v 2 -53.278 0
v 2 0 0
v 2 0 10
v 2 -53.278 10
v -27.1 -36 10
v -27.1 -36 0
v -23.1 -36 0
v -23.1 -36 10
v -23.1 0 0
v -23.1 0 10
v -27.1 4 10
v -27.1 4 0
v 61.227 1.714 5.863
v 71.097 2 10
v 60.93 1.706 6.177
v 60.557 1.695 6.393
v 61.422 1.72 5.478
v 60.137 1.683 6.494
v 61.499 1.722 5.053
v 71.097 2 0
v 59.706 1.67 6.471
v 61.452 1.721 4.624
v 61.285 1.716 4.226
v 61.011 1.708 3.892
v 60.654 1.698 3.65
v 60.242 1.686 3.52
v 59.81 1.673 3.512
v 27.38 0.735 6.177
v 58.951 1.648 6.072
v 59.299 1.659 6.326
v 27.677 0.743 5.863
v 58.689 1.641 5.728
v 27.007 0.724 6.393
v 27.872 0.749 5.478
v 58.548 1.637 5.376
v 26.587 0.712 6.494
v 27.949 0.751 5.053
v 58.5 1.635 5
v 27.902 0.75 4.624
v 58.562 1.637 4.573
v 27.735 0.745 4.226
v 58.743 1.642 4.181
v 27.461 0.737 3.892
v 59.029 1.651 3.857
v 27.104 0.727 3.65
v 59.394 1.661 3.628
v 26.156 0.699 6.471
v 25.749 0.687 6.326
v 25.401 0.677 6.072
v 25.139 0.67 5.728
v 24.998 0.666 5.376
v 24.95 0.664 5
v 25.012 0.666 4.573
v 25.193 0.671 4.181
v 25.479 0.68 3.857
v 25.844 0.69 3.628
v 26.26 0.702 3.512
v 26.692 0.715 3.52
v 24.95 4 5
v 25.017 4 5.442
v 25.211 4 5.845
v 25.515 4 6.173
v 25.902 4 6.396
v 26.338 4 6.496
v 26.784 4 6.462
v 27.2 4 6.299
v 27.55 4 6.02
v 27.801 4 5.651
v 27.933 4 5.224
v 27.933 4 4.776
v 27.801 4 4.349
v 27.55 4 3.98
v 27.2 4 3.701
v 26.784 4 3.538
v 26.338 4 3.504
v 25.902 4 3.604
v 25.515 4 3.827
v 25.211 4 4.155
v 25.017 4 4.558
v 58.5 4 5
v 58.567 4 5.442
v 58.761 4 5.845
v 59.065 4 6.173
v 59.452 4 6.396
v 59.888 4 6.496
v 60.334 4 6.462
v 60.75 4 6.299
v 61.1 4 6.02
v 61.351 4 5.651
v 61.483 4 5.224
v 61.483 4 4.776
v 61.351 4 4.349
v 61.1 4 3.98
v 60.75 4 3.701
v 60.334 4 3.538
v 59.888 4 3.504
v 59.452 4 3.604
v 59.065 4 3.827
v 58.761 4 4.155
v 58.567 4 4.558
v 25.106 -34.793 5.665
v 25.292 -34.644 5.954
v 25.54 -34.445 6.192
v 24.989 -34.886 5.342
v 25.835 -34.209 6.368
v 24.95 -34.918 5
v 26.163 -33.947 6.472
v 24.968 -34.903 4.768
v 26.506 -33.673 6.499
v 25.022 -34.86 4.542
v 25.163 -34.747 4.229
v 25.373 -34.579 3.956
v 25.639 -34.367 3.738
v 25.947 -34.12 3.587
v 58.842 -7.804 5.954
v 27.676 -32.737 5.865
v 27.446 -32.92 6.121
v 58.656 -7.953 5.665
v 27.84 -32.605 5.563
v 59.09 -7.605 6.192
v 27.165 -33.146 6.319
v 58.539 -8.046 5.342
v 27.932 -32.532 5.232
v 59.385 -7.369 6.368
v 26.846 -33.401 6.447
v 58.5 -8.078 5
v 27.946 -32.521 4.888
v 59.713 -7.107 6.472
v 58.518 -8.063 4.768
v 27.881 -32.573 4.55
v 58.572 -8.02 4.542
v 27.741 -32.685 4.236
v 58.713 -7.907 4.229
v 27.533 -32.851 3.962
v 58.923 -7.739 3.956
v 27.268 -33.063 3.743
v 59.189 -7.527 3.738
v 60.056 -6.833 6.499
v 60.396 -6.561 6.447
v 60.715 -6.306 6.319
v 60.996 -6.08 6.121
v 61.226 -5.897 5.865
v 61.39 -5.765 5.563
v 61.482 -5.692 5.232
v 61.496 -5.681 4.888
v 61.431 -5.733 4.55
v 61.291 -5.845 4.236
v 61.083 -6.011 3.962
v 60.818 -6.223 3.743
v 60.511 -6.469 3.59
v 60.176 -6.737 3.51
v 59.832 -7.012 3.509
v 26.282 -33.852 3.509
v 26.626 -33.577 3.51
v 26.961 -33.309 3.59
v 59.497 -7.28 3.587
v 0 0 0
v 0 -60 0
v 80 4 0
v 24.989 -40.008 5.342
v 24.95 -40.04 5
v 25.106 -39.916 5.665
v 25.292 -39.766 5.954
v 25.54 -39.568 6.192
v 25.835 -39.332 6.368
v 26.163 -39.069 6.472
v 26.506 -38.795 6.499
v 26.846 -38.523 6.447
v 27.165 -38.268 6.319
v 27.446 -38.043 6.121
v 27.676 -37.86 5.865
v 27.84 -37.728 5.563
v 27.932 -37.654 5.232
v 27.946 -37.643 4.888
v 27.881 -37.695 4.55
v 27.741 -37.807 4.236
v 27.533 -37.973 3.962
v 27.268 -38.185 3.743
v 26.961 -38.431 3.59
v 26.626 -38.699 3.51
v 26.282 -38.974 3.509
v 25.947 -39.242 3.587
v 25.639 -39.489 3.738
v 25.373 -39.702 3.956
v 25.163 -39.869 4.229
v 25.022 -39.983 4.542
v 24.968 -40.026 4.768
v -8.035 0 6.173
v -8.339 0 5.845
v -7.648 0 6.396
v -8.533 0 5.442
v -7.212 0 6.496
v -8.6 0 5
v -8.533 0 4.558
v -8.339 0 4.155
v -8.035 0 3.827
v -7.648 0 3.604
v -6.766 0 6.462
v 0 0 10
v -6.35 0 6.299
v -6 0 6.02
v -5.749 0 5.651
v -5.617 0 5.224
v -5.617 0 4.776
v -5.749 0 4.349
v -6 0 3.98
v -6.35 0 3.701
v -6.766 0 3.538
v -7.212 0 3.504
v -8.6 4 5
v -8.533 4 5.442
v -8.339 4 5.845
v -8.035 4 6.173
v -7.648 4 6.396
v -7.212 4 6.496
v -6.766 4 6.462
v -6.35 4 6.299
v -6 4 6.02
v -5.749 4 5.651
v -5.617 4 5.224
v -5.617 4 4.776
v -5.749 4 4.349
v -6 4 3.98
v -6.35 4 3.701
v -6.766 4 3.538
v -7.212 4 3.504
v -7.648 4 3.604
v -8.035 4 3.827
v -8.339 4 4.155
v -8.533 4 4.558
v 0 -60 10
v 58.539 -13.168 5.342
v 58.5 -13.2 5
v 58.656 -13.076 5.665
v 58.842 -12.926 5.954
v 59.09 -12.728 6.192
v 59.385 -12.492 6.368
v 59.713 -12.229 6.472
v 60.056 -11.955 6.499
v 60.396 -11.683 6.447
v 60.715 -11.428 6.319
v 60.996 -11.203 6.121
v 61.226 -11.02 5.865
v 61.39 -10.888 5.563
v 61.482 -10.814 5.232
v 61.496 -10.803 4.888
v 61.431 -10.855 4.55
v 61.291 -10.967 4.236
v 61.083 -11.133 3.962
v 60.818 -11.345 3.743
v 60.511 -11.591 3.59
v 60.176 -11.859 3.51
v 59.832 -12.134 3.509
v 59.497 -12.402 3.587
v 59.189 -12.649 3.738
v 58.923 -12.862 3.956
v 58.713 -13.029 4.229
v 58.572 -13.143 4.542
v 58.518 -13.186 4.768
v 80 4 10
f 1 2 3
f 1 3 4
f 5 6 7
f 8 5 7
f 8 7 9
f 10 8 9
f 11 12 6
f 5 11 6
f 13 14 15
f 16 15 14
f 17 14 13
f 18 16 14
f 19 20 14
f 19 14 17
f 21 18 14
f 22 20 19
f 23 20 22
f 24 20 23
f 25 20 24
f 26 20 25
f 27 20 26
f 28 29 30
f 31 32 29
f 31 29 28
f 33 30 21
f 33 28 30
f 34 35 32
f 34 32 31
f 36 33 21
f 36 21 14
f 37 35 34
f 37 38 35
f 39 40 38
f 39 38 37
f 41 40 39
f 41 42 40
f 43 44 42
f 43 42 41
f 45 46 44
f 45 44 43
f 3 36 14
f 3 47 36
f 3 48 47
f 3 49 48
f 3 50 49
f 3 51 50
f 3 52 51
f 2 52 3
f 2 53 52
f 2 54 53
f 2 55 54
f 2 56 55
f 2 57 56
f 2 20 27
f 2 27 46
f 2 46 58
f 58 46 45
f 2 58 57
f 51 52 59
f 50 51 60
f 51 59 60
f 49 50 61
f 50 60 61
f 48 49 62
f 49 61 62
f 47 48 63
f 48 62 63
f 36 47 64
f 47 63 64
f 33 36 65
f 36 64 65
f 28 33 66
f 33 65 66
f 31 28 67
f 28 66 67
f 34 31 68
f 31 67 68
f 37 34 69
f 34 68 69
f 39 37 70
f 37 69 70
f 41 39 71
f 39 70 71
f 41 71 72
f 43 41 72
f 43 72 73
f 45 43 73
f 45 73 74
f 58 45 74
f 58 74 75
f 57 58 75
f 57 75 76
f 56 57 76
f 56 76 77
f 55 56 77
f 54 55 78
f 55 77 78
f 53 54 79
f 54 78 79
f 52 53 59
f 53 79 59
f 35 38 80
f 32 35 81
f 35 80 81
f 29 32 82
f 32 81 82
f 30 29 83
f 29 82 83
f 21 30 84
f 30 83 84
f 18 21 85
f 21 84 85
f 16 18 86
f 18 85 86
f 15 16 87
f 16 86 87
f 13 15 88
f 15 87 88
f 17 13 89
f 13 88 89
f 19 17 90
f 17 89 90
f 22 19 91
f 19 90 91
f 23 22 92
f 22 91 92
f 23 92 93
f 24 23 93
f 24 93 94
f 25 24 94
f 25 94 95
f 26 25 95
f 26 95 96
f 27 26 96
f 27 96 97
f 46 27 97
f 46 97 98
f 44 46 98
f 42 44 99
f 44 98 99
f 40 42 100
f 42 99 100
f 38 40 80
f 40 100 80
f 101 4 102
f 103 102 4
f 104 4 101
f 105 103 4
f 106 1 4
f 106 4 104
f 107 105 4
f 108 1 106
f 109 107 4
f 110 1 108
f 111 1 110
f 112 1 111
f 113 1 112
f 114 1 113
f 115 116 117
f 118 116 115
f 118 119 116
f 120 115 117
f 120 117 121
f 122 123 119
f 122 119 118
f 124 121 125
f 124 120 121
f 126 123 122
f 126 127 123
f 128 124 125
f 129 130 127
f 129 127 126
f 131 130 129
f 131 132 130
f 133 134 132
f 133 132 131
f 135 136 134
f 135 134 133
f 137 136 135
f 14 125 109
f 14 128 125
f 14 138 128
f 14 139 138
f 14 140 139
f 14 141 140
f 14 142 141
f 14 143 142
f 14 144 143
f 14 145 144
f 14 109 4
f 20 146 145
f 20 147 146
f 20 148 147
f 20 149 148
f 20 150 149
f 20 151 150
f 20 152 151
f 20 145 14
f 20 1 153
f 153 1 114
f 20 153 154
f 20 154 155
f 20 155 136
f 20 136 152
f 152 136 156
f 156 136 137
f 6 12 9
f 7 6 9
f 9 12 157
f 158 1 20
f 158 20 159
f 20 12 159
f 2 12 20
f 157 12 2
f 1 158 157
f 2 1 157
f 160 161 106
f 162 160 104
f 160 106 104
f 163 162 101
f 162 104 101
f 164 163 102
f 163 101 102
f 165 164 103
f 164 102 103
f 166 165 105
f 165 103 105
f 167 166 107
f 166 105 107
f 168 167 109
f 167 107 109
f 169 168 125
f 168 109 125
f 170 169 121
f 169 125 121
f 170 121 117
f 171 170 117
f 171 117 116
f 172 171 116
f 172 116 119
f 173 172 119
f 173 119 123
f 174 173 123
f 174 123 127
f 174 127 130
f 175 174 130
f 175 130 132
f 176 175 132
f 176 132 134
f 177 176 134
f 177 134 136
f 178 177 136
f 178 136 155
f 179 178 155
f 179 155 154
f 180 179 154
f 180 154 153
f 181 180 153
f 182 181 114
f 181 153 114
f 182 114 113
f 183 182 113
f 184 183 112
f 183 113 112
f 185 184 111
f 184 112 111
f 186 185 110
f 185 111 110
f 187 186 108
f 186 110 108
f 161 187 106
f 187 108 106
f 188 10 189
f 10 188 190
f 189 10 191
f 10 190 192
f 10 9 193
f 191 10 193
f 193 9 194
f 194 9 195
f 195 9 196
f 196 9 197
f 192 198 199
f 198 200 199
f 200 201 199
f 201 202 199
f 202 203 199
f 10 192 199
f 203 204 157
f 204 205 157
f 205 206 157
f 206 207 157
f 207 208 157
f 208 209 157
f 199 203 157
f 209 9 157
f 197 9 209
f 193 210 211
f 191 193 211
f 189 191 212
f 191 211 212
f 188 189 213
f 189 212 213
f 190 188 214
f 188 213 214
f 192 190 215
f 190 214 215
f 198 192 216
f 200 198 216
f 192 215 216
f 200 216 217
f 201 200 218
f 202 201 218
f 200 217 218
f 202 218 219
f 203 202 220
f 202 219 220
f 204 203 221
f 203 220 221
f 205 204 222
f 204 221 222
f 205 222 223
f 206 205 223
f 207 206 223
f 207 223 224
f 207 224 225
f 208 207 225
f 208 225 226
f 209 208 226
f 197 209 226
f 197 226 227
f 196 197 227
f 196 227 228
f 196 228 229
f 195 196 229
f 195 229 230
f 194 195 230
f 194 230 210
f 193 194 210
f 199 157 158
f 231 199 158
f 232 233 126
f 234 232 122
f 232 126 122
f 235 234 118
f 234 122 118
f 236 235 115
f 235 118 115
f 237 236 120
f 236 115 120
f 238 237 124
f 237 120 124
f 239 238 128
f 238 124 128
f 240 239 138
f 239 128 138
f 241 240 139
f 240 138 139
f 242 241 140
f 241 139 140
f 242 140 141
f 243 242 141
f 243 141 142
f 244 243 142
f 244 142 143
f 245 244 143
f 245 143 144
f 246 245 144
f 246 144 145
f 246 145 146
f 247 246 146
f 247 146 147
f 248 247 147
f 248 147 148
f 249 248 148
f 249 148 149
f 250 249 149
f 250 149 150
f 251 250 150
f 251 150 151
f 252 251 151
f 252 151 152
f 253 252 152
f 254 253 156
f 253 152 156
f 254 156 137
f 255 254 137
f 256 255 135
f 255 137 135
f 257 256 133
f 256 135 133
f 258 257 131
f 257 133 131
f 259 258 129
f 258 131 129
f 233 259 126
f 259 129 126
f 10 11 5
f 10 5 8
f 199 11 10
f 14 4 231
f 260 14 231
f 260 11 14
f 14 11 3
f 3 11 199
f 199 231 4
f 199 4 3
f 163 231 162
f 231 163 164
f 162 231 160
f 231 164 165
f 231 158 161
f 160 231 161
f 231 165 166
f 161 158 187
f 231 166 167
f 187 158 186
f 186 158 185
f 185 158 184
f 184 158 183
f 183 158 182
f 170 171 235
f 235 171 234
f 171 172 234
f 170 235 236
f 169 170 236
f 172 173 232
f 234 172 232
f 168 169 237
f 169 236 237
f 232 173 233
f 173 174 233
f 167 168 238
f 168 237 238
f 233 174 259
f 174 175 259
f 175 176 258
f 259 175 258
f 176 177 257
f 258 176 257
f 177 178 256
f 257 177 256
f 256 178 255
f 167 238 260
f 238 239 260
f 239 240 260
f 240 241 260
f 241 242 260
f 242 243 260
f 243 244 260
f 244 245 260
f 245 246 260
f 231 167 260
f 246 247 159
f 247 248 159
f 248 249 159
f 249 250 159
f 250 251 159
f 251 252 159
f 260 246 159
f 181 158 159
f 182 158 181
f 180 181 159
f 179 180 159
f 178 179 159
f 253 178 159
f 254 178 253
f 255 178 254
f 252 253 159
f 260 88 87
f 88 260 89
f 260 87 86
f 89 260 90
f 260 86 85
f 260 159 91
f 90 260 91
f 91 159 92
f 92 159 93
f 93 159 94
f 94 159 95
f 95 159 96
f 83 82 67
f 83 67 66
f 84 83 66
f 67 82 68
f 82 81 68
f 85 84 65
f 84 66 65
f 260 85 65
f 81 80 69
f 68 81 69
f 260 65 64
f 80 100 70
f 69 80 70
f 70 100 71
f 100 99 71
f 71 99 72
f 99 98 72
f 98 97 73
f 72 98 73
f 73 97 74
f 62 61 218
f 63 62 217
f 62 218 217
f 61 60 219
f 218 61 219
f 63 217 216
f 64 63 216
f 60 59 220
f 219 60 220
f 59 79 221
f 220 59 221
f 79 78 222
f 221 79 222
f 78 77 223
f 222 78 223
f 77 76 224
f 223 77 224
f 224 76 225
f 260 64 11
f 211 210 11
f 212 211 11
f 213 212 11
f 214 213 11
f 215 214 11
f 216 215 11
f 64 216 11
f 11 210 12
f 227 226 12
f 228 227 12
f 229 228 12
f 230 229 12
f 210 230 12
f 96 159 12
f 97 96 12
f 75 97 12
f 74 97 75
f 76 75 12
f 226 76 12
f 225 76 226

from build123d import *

# Parameters (mm, degrees)
PAD_DEPTH    = 10
SKETCH001_R  = 1.5
POCKET_DEPTH = 64.001


with BuildPart() as part:
    # Sketch → Pad (new body)
    with BuildSketch(Plane.XY):
        Polygon((80, 4), (-27.1, 4), (-27.1, -36), (-23.1, -36), (-23.1, 0), (0, 0), (0, -60), align=None)
        Polygon((2, 0), (2, -53.277501), (71.096876, 2), align=None, mode=Mode.SUBTRACT)
    extrude(amount=PAD_DEPTH)

    # Sketch001 (on Face5 of Pad) → Pocket (cut, through all)
    with BuildSketch(Plane(origin=(0, 4, 0), x_dir=(-1, 0, 0), z_dir=(0, 1, 0))):
        with Locations((-60, 5)):
            Circle(SKETCH001_R)
        with Locations((7.1, 5)):
            Circle(SKETCH001_R)
        with Locations((-26.45, 5)):
            Circle(SKETCH001_R)
    extrude(amount=-POCKET_DEPTH, mode=Mode.SUBTRACT)


solid = part.part
